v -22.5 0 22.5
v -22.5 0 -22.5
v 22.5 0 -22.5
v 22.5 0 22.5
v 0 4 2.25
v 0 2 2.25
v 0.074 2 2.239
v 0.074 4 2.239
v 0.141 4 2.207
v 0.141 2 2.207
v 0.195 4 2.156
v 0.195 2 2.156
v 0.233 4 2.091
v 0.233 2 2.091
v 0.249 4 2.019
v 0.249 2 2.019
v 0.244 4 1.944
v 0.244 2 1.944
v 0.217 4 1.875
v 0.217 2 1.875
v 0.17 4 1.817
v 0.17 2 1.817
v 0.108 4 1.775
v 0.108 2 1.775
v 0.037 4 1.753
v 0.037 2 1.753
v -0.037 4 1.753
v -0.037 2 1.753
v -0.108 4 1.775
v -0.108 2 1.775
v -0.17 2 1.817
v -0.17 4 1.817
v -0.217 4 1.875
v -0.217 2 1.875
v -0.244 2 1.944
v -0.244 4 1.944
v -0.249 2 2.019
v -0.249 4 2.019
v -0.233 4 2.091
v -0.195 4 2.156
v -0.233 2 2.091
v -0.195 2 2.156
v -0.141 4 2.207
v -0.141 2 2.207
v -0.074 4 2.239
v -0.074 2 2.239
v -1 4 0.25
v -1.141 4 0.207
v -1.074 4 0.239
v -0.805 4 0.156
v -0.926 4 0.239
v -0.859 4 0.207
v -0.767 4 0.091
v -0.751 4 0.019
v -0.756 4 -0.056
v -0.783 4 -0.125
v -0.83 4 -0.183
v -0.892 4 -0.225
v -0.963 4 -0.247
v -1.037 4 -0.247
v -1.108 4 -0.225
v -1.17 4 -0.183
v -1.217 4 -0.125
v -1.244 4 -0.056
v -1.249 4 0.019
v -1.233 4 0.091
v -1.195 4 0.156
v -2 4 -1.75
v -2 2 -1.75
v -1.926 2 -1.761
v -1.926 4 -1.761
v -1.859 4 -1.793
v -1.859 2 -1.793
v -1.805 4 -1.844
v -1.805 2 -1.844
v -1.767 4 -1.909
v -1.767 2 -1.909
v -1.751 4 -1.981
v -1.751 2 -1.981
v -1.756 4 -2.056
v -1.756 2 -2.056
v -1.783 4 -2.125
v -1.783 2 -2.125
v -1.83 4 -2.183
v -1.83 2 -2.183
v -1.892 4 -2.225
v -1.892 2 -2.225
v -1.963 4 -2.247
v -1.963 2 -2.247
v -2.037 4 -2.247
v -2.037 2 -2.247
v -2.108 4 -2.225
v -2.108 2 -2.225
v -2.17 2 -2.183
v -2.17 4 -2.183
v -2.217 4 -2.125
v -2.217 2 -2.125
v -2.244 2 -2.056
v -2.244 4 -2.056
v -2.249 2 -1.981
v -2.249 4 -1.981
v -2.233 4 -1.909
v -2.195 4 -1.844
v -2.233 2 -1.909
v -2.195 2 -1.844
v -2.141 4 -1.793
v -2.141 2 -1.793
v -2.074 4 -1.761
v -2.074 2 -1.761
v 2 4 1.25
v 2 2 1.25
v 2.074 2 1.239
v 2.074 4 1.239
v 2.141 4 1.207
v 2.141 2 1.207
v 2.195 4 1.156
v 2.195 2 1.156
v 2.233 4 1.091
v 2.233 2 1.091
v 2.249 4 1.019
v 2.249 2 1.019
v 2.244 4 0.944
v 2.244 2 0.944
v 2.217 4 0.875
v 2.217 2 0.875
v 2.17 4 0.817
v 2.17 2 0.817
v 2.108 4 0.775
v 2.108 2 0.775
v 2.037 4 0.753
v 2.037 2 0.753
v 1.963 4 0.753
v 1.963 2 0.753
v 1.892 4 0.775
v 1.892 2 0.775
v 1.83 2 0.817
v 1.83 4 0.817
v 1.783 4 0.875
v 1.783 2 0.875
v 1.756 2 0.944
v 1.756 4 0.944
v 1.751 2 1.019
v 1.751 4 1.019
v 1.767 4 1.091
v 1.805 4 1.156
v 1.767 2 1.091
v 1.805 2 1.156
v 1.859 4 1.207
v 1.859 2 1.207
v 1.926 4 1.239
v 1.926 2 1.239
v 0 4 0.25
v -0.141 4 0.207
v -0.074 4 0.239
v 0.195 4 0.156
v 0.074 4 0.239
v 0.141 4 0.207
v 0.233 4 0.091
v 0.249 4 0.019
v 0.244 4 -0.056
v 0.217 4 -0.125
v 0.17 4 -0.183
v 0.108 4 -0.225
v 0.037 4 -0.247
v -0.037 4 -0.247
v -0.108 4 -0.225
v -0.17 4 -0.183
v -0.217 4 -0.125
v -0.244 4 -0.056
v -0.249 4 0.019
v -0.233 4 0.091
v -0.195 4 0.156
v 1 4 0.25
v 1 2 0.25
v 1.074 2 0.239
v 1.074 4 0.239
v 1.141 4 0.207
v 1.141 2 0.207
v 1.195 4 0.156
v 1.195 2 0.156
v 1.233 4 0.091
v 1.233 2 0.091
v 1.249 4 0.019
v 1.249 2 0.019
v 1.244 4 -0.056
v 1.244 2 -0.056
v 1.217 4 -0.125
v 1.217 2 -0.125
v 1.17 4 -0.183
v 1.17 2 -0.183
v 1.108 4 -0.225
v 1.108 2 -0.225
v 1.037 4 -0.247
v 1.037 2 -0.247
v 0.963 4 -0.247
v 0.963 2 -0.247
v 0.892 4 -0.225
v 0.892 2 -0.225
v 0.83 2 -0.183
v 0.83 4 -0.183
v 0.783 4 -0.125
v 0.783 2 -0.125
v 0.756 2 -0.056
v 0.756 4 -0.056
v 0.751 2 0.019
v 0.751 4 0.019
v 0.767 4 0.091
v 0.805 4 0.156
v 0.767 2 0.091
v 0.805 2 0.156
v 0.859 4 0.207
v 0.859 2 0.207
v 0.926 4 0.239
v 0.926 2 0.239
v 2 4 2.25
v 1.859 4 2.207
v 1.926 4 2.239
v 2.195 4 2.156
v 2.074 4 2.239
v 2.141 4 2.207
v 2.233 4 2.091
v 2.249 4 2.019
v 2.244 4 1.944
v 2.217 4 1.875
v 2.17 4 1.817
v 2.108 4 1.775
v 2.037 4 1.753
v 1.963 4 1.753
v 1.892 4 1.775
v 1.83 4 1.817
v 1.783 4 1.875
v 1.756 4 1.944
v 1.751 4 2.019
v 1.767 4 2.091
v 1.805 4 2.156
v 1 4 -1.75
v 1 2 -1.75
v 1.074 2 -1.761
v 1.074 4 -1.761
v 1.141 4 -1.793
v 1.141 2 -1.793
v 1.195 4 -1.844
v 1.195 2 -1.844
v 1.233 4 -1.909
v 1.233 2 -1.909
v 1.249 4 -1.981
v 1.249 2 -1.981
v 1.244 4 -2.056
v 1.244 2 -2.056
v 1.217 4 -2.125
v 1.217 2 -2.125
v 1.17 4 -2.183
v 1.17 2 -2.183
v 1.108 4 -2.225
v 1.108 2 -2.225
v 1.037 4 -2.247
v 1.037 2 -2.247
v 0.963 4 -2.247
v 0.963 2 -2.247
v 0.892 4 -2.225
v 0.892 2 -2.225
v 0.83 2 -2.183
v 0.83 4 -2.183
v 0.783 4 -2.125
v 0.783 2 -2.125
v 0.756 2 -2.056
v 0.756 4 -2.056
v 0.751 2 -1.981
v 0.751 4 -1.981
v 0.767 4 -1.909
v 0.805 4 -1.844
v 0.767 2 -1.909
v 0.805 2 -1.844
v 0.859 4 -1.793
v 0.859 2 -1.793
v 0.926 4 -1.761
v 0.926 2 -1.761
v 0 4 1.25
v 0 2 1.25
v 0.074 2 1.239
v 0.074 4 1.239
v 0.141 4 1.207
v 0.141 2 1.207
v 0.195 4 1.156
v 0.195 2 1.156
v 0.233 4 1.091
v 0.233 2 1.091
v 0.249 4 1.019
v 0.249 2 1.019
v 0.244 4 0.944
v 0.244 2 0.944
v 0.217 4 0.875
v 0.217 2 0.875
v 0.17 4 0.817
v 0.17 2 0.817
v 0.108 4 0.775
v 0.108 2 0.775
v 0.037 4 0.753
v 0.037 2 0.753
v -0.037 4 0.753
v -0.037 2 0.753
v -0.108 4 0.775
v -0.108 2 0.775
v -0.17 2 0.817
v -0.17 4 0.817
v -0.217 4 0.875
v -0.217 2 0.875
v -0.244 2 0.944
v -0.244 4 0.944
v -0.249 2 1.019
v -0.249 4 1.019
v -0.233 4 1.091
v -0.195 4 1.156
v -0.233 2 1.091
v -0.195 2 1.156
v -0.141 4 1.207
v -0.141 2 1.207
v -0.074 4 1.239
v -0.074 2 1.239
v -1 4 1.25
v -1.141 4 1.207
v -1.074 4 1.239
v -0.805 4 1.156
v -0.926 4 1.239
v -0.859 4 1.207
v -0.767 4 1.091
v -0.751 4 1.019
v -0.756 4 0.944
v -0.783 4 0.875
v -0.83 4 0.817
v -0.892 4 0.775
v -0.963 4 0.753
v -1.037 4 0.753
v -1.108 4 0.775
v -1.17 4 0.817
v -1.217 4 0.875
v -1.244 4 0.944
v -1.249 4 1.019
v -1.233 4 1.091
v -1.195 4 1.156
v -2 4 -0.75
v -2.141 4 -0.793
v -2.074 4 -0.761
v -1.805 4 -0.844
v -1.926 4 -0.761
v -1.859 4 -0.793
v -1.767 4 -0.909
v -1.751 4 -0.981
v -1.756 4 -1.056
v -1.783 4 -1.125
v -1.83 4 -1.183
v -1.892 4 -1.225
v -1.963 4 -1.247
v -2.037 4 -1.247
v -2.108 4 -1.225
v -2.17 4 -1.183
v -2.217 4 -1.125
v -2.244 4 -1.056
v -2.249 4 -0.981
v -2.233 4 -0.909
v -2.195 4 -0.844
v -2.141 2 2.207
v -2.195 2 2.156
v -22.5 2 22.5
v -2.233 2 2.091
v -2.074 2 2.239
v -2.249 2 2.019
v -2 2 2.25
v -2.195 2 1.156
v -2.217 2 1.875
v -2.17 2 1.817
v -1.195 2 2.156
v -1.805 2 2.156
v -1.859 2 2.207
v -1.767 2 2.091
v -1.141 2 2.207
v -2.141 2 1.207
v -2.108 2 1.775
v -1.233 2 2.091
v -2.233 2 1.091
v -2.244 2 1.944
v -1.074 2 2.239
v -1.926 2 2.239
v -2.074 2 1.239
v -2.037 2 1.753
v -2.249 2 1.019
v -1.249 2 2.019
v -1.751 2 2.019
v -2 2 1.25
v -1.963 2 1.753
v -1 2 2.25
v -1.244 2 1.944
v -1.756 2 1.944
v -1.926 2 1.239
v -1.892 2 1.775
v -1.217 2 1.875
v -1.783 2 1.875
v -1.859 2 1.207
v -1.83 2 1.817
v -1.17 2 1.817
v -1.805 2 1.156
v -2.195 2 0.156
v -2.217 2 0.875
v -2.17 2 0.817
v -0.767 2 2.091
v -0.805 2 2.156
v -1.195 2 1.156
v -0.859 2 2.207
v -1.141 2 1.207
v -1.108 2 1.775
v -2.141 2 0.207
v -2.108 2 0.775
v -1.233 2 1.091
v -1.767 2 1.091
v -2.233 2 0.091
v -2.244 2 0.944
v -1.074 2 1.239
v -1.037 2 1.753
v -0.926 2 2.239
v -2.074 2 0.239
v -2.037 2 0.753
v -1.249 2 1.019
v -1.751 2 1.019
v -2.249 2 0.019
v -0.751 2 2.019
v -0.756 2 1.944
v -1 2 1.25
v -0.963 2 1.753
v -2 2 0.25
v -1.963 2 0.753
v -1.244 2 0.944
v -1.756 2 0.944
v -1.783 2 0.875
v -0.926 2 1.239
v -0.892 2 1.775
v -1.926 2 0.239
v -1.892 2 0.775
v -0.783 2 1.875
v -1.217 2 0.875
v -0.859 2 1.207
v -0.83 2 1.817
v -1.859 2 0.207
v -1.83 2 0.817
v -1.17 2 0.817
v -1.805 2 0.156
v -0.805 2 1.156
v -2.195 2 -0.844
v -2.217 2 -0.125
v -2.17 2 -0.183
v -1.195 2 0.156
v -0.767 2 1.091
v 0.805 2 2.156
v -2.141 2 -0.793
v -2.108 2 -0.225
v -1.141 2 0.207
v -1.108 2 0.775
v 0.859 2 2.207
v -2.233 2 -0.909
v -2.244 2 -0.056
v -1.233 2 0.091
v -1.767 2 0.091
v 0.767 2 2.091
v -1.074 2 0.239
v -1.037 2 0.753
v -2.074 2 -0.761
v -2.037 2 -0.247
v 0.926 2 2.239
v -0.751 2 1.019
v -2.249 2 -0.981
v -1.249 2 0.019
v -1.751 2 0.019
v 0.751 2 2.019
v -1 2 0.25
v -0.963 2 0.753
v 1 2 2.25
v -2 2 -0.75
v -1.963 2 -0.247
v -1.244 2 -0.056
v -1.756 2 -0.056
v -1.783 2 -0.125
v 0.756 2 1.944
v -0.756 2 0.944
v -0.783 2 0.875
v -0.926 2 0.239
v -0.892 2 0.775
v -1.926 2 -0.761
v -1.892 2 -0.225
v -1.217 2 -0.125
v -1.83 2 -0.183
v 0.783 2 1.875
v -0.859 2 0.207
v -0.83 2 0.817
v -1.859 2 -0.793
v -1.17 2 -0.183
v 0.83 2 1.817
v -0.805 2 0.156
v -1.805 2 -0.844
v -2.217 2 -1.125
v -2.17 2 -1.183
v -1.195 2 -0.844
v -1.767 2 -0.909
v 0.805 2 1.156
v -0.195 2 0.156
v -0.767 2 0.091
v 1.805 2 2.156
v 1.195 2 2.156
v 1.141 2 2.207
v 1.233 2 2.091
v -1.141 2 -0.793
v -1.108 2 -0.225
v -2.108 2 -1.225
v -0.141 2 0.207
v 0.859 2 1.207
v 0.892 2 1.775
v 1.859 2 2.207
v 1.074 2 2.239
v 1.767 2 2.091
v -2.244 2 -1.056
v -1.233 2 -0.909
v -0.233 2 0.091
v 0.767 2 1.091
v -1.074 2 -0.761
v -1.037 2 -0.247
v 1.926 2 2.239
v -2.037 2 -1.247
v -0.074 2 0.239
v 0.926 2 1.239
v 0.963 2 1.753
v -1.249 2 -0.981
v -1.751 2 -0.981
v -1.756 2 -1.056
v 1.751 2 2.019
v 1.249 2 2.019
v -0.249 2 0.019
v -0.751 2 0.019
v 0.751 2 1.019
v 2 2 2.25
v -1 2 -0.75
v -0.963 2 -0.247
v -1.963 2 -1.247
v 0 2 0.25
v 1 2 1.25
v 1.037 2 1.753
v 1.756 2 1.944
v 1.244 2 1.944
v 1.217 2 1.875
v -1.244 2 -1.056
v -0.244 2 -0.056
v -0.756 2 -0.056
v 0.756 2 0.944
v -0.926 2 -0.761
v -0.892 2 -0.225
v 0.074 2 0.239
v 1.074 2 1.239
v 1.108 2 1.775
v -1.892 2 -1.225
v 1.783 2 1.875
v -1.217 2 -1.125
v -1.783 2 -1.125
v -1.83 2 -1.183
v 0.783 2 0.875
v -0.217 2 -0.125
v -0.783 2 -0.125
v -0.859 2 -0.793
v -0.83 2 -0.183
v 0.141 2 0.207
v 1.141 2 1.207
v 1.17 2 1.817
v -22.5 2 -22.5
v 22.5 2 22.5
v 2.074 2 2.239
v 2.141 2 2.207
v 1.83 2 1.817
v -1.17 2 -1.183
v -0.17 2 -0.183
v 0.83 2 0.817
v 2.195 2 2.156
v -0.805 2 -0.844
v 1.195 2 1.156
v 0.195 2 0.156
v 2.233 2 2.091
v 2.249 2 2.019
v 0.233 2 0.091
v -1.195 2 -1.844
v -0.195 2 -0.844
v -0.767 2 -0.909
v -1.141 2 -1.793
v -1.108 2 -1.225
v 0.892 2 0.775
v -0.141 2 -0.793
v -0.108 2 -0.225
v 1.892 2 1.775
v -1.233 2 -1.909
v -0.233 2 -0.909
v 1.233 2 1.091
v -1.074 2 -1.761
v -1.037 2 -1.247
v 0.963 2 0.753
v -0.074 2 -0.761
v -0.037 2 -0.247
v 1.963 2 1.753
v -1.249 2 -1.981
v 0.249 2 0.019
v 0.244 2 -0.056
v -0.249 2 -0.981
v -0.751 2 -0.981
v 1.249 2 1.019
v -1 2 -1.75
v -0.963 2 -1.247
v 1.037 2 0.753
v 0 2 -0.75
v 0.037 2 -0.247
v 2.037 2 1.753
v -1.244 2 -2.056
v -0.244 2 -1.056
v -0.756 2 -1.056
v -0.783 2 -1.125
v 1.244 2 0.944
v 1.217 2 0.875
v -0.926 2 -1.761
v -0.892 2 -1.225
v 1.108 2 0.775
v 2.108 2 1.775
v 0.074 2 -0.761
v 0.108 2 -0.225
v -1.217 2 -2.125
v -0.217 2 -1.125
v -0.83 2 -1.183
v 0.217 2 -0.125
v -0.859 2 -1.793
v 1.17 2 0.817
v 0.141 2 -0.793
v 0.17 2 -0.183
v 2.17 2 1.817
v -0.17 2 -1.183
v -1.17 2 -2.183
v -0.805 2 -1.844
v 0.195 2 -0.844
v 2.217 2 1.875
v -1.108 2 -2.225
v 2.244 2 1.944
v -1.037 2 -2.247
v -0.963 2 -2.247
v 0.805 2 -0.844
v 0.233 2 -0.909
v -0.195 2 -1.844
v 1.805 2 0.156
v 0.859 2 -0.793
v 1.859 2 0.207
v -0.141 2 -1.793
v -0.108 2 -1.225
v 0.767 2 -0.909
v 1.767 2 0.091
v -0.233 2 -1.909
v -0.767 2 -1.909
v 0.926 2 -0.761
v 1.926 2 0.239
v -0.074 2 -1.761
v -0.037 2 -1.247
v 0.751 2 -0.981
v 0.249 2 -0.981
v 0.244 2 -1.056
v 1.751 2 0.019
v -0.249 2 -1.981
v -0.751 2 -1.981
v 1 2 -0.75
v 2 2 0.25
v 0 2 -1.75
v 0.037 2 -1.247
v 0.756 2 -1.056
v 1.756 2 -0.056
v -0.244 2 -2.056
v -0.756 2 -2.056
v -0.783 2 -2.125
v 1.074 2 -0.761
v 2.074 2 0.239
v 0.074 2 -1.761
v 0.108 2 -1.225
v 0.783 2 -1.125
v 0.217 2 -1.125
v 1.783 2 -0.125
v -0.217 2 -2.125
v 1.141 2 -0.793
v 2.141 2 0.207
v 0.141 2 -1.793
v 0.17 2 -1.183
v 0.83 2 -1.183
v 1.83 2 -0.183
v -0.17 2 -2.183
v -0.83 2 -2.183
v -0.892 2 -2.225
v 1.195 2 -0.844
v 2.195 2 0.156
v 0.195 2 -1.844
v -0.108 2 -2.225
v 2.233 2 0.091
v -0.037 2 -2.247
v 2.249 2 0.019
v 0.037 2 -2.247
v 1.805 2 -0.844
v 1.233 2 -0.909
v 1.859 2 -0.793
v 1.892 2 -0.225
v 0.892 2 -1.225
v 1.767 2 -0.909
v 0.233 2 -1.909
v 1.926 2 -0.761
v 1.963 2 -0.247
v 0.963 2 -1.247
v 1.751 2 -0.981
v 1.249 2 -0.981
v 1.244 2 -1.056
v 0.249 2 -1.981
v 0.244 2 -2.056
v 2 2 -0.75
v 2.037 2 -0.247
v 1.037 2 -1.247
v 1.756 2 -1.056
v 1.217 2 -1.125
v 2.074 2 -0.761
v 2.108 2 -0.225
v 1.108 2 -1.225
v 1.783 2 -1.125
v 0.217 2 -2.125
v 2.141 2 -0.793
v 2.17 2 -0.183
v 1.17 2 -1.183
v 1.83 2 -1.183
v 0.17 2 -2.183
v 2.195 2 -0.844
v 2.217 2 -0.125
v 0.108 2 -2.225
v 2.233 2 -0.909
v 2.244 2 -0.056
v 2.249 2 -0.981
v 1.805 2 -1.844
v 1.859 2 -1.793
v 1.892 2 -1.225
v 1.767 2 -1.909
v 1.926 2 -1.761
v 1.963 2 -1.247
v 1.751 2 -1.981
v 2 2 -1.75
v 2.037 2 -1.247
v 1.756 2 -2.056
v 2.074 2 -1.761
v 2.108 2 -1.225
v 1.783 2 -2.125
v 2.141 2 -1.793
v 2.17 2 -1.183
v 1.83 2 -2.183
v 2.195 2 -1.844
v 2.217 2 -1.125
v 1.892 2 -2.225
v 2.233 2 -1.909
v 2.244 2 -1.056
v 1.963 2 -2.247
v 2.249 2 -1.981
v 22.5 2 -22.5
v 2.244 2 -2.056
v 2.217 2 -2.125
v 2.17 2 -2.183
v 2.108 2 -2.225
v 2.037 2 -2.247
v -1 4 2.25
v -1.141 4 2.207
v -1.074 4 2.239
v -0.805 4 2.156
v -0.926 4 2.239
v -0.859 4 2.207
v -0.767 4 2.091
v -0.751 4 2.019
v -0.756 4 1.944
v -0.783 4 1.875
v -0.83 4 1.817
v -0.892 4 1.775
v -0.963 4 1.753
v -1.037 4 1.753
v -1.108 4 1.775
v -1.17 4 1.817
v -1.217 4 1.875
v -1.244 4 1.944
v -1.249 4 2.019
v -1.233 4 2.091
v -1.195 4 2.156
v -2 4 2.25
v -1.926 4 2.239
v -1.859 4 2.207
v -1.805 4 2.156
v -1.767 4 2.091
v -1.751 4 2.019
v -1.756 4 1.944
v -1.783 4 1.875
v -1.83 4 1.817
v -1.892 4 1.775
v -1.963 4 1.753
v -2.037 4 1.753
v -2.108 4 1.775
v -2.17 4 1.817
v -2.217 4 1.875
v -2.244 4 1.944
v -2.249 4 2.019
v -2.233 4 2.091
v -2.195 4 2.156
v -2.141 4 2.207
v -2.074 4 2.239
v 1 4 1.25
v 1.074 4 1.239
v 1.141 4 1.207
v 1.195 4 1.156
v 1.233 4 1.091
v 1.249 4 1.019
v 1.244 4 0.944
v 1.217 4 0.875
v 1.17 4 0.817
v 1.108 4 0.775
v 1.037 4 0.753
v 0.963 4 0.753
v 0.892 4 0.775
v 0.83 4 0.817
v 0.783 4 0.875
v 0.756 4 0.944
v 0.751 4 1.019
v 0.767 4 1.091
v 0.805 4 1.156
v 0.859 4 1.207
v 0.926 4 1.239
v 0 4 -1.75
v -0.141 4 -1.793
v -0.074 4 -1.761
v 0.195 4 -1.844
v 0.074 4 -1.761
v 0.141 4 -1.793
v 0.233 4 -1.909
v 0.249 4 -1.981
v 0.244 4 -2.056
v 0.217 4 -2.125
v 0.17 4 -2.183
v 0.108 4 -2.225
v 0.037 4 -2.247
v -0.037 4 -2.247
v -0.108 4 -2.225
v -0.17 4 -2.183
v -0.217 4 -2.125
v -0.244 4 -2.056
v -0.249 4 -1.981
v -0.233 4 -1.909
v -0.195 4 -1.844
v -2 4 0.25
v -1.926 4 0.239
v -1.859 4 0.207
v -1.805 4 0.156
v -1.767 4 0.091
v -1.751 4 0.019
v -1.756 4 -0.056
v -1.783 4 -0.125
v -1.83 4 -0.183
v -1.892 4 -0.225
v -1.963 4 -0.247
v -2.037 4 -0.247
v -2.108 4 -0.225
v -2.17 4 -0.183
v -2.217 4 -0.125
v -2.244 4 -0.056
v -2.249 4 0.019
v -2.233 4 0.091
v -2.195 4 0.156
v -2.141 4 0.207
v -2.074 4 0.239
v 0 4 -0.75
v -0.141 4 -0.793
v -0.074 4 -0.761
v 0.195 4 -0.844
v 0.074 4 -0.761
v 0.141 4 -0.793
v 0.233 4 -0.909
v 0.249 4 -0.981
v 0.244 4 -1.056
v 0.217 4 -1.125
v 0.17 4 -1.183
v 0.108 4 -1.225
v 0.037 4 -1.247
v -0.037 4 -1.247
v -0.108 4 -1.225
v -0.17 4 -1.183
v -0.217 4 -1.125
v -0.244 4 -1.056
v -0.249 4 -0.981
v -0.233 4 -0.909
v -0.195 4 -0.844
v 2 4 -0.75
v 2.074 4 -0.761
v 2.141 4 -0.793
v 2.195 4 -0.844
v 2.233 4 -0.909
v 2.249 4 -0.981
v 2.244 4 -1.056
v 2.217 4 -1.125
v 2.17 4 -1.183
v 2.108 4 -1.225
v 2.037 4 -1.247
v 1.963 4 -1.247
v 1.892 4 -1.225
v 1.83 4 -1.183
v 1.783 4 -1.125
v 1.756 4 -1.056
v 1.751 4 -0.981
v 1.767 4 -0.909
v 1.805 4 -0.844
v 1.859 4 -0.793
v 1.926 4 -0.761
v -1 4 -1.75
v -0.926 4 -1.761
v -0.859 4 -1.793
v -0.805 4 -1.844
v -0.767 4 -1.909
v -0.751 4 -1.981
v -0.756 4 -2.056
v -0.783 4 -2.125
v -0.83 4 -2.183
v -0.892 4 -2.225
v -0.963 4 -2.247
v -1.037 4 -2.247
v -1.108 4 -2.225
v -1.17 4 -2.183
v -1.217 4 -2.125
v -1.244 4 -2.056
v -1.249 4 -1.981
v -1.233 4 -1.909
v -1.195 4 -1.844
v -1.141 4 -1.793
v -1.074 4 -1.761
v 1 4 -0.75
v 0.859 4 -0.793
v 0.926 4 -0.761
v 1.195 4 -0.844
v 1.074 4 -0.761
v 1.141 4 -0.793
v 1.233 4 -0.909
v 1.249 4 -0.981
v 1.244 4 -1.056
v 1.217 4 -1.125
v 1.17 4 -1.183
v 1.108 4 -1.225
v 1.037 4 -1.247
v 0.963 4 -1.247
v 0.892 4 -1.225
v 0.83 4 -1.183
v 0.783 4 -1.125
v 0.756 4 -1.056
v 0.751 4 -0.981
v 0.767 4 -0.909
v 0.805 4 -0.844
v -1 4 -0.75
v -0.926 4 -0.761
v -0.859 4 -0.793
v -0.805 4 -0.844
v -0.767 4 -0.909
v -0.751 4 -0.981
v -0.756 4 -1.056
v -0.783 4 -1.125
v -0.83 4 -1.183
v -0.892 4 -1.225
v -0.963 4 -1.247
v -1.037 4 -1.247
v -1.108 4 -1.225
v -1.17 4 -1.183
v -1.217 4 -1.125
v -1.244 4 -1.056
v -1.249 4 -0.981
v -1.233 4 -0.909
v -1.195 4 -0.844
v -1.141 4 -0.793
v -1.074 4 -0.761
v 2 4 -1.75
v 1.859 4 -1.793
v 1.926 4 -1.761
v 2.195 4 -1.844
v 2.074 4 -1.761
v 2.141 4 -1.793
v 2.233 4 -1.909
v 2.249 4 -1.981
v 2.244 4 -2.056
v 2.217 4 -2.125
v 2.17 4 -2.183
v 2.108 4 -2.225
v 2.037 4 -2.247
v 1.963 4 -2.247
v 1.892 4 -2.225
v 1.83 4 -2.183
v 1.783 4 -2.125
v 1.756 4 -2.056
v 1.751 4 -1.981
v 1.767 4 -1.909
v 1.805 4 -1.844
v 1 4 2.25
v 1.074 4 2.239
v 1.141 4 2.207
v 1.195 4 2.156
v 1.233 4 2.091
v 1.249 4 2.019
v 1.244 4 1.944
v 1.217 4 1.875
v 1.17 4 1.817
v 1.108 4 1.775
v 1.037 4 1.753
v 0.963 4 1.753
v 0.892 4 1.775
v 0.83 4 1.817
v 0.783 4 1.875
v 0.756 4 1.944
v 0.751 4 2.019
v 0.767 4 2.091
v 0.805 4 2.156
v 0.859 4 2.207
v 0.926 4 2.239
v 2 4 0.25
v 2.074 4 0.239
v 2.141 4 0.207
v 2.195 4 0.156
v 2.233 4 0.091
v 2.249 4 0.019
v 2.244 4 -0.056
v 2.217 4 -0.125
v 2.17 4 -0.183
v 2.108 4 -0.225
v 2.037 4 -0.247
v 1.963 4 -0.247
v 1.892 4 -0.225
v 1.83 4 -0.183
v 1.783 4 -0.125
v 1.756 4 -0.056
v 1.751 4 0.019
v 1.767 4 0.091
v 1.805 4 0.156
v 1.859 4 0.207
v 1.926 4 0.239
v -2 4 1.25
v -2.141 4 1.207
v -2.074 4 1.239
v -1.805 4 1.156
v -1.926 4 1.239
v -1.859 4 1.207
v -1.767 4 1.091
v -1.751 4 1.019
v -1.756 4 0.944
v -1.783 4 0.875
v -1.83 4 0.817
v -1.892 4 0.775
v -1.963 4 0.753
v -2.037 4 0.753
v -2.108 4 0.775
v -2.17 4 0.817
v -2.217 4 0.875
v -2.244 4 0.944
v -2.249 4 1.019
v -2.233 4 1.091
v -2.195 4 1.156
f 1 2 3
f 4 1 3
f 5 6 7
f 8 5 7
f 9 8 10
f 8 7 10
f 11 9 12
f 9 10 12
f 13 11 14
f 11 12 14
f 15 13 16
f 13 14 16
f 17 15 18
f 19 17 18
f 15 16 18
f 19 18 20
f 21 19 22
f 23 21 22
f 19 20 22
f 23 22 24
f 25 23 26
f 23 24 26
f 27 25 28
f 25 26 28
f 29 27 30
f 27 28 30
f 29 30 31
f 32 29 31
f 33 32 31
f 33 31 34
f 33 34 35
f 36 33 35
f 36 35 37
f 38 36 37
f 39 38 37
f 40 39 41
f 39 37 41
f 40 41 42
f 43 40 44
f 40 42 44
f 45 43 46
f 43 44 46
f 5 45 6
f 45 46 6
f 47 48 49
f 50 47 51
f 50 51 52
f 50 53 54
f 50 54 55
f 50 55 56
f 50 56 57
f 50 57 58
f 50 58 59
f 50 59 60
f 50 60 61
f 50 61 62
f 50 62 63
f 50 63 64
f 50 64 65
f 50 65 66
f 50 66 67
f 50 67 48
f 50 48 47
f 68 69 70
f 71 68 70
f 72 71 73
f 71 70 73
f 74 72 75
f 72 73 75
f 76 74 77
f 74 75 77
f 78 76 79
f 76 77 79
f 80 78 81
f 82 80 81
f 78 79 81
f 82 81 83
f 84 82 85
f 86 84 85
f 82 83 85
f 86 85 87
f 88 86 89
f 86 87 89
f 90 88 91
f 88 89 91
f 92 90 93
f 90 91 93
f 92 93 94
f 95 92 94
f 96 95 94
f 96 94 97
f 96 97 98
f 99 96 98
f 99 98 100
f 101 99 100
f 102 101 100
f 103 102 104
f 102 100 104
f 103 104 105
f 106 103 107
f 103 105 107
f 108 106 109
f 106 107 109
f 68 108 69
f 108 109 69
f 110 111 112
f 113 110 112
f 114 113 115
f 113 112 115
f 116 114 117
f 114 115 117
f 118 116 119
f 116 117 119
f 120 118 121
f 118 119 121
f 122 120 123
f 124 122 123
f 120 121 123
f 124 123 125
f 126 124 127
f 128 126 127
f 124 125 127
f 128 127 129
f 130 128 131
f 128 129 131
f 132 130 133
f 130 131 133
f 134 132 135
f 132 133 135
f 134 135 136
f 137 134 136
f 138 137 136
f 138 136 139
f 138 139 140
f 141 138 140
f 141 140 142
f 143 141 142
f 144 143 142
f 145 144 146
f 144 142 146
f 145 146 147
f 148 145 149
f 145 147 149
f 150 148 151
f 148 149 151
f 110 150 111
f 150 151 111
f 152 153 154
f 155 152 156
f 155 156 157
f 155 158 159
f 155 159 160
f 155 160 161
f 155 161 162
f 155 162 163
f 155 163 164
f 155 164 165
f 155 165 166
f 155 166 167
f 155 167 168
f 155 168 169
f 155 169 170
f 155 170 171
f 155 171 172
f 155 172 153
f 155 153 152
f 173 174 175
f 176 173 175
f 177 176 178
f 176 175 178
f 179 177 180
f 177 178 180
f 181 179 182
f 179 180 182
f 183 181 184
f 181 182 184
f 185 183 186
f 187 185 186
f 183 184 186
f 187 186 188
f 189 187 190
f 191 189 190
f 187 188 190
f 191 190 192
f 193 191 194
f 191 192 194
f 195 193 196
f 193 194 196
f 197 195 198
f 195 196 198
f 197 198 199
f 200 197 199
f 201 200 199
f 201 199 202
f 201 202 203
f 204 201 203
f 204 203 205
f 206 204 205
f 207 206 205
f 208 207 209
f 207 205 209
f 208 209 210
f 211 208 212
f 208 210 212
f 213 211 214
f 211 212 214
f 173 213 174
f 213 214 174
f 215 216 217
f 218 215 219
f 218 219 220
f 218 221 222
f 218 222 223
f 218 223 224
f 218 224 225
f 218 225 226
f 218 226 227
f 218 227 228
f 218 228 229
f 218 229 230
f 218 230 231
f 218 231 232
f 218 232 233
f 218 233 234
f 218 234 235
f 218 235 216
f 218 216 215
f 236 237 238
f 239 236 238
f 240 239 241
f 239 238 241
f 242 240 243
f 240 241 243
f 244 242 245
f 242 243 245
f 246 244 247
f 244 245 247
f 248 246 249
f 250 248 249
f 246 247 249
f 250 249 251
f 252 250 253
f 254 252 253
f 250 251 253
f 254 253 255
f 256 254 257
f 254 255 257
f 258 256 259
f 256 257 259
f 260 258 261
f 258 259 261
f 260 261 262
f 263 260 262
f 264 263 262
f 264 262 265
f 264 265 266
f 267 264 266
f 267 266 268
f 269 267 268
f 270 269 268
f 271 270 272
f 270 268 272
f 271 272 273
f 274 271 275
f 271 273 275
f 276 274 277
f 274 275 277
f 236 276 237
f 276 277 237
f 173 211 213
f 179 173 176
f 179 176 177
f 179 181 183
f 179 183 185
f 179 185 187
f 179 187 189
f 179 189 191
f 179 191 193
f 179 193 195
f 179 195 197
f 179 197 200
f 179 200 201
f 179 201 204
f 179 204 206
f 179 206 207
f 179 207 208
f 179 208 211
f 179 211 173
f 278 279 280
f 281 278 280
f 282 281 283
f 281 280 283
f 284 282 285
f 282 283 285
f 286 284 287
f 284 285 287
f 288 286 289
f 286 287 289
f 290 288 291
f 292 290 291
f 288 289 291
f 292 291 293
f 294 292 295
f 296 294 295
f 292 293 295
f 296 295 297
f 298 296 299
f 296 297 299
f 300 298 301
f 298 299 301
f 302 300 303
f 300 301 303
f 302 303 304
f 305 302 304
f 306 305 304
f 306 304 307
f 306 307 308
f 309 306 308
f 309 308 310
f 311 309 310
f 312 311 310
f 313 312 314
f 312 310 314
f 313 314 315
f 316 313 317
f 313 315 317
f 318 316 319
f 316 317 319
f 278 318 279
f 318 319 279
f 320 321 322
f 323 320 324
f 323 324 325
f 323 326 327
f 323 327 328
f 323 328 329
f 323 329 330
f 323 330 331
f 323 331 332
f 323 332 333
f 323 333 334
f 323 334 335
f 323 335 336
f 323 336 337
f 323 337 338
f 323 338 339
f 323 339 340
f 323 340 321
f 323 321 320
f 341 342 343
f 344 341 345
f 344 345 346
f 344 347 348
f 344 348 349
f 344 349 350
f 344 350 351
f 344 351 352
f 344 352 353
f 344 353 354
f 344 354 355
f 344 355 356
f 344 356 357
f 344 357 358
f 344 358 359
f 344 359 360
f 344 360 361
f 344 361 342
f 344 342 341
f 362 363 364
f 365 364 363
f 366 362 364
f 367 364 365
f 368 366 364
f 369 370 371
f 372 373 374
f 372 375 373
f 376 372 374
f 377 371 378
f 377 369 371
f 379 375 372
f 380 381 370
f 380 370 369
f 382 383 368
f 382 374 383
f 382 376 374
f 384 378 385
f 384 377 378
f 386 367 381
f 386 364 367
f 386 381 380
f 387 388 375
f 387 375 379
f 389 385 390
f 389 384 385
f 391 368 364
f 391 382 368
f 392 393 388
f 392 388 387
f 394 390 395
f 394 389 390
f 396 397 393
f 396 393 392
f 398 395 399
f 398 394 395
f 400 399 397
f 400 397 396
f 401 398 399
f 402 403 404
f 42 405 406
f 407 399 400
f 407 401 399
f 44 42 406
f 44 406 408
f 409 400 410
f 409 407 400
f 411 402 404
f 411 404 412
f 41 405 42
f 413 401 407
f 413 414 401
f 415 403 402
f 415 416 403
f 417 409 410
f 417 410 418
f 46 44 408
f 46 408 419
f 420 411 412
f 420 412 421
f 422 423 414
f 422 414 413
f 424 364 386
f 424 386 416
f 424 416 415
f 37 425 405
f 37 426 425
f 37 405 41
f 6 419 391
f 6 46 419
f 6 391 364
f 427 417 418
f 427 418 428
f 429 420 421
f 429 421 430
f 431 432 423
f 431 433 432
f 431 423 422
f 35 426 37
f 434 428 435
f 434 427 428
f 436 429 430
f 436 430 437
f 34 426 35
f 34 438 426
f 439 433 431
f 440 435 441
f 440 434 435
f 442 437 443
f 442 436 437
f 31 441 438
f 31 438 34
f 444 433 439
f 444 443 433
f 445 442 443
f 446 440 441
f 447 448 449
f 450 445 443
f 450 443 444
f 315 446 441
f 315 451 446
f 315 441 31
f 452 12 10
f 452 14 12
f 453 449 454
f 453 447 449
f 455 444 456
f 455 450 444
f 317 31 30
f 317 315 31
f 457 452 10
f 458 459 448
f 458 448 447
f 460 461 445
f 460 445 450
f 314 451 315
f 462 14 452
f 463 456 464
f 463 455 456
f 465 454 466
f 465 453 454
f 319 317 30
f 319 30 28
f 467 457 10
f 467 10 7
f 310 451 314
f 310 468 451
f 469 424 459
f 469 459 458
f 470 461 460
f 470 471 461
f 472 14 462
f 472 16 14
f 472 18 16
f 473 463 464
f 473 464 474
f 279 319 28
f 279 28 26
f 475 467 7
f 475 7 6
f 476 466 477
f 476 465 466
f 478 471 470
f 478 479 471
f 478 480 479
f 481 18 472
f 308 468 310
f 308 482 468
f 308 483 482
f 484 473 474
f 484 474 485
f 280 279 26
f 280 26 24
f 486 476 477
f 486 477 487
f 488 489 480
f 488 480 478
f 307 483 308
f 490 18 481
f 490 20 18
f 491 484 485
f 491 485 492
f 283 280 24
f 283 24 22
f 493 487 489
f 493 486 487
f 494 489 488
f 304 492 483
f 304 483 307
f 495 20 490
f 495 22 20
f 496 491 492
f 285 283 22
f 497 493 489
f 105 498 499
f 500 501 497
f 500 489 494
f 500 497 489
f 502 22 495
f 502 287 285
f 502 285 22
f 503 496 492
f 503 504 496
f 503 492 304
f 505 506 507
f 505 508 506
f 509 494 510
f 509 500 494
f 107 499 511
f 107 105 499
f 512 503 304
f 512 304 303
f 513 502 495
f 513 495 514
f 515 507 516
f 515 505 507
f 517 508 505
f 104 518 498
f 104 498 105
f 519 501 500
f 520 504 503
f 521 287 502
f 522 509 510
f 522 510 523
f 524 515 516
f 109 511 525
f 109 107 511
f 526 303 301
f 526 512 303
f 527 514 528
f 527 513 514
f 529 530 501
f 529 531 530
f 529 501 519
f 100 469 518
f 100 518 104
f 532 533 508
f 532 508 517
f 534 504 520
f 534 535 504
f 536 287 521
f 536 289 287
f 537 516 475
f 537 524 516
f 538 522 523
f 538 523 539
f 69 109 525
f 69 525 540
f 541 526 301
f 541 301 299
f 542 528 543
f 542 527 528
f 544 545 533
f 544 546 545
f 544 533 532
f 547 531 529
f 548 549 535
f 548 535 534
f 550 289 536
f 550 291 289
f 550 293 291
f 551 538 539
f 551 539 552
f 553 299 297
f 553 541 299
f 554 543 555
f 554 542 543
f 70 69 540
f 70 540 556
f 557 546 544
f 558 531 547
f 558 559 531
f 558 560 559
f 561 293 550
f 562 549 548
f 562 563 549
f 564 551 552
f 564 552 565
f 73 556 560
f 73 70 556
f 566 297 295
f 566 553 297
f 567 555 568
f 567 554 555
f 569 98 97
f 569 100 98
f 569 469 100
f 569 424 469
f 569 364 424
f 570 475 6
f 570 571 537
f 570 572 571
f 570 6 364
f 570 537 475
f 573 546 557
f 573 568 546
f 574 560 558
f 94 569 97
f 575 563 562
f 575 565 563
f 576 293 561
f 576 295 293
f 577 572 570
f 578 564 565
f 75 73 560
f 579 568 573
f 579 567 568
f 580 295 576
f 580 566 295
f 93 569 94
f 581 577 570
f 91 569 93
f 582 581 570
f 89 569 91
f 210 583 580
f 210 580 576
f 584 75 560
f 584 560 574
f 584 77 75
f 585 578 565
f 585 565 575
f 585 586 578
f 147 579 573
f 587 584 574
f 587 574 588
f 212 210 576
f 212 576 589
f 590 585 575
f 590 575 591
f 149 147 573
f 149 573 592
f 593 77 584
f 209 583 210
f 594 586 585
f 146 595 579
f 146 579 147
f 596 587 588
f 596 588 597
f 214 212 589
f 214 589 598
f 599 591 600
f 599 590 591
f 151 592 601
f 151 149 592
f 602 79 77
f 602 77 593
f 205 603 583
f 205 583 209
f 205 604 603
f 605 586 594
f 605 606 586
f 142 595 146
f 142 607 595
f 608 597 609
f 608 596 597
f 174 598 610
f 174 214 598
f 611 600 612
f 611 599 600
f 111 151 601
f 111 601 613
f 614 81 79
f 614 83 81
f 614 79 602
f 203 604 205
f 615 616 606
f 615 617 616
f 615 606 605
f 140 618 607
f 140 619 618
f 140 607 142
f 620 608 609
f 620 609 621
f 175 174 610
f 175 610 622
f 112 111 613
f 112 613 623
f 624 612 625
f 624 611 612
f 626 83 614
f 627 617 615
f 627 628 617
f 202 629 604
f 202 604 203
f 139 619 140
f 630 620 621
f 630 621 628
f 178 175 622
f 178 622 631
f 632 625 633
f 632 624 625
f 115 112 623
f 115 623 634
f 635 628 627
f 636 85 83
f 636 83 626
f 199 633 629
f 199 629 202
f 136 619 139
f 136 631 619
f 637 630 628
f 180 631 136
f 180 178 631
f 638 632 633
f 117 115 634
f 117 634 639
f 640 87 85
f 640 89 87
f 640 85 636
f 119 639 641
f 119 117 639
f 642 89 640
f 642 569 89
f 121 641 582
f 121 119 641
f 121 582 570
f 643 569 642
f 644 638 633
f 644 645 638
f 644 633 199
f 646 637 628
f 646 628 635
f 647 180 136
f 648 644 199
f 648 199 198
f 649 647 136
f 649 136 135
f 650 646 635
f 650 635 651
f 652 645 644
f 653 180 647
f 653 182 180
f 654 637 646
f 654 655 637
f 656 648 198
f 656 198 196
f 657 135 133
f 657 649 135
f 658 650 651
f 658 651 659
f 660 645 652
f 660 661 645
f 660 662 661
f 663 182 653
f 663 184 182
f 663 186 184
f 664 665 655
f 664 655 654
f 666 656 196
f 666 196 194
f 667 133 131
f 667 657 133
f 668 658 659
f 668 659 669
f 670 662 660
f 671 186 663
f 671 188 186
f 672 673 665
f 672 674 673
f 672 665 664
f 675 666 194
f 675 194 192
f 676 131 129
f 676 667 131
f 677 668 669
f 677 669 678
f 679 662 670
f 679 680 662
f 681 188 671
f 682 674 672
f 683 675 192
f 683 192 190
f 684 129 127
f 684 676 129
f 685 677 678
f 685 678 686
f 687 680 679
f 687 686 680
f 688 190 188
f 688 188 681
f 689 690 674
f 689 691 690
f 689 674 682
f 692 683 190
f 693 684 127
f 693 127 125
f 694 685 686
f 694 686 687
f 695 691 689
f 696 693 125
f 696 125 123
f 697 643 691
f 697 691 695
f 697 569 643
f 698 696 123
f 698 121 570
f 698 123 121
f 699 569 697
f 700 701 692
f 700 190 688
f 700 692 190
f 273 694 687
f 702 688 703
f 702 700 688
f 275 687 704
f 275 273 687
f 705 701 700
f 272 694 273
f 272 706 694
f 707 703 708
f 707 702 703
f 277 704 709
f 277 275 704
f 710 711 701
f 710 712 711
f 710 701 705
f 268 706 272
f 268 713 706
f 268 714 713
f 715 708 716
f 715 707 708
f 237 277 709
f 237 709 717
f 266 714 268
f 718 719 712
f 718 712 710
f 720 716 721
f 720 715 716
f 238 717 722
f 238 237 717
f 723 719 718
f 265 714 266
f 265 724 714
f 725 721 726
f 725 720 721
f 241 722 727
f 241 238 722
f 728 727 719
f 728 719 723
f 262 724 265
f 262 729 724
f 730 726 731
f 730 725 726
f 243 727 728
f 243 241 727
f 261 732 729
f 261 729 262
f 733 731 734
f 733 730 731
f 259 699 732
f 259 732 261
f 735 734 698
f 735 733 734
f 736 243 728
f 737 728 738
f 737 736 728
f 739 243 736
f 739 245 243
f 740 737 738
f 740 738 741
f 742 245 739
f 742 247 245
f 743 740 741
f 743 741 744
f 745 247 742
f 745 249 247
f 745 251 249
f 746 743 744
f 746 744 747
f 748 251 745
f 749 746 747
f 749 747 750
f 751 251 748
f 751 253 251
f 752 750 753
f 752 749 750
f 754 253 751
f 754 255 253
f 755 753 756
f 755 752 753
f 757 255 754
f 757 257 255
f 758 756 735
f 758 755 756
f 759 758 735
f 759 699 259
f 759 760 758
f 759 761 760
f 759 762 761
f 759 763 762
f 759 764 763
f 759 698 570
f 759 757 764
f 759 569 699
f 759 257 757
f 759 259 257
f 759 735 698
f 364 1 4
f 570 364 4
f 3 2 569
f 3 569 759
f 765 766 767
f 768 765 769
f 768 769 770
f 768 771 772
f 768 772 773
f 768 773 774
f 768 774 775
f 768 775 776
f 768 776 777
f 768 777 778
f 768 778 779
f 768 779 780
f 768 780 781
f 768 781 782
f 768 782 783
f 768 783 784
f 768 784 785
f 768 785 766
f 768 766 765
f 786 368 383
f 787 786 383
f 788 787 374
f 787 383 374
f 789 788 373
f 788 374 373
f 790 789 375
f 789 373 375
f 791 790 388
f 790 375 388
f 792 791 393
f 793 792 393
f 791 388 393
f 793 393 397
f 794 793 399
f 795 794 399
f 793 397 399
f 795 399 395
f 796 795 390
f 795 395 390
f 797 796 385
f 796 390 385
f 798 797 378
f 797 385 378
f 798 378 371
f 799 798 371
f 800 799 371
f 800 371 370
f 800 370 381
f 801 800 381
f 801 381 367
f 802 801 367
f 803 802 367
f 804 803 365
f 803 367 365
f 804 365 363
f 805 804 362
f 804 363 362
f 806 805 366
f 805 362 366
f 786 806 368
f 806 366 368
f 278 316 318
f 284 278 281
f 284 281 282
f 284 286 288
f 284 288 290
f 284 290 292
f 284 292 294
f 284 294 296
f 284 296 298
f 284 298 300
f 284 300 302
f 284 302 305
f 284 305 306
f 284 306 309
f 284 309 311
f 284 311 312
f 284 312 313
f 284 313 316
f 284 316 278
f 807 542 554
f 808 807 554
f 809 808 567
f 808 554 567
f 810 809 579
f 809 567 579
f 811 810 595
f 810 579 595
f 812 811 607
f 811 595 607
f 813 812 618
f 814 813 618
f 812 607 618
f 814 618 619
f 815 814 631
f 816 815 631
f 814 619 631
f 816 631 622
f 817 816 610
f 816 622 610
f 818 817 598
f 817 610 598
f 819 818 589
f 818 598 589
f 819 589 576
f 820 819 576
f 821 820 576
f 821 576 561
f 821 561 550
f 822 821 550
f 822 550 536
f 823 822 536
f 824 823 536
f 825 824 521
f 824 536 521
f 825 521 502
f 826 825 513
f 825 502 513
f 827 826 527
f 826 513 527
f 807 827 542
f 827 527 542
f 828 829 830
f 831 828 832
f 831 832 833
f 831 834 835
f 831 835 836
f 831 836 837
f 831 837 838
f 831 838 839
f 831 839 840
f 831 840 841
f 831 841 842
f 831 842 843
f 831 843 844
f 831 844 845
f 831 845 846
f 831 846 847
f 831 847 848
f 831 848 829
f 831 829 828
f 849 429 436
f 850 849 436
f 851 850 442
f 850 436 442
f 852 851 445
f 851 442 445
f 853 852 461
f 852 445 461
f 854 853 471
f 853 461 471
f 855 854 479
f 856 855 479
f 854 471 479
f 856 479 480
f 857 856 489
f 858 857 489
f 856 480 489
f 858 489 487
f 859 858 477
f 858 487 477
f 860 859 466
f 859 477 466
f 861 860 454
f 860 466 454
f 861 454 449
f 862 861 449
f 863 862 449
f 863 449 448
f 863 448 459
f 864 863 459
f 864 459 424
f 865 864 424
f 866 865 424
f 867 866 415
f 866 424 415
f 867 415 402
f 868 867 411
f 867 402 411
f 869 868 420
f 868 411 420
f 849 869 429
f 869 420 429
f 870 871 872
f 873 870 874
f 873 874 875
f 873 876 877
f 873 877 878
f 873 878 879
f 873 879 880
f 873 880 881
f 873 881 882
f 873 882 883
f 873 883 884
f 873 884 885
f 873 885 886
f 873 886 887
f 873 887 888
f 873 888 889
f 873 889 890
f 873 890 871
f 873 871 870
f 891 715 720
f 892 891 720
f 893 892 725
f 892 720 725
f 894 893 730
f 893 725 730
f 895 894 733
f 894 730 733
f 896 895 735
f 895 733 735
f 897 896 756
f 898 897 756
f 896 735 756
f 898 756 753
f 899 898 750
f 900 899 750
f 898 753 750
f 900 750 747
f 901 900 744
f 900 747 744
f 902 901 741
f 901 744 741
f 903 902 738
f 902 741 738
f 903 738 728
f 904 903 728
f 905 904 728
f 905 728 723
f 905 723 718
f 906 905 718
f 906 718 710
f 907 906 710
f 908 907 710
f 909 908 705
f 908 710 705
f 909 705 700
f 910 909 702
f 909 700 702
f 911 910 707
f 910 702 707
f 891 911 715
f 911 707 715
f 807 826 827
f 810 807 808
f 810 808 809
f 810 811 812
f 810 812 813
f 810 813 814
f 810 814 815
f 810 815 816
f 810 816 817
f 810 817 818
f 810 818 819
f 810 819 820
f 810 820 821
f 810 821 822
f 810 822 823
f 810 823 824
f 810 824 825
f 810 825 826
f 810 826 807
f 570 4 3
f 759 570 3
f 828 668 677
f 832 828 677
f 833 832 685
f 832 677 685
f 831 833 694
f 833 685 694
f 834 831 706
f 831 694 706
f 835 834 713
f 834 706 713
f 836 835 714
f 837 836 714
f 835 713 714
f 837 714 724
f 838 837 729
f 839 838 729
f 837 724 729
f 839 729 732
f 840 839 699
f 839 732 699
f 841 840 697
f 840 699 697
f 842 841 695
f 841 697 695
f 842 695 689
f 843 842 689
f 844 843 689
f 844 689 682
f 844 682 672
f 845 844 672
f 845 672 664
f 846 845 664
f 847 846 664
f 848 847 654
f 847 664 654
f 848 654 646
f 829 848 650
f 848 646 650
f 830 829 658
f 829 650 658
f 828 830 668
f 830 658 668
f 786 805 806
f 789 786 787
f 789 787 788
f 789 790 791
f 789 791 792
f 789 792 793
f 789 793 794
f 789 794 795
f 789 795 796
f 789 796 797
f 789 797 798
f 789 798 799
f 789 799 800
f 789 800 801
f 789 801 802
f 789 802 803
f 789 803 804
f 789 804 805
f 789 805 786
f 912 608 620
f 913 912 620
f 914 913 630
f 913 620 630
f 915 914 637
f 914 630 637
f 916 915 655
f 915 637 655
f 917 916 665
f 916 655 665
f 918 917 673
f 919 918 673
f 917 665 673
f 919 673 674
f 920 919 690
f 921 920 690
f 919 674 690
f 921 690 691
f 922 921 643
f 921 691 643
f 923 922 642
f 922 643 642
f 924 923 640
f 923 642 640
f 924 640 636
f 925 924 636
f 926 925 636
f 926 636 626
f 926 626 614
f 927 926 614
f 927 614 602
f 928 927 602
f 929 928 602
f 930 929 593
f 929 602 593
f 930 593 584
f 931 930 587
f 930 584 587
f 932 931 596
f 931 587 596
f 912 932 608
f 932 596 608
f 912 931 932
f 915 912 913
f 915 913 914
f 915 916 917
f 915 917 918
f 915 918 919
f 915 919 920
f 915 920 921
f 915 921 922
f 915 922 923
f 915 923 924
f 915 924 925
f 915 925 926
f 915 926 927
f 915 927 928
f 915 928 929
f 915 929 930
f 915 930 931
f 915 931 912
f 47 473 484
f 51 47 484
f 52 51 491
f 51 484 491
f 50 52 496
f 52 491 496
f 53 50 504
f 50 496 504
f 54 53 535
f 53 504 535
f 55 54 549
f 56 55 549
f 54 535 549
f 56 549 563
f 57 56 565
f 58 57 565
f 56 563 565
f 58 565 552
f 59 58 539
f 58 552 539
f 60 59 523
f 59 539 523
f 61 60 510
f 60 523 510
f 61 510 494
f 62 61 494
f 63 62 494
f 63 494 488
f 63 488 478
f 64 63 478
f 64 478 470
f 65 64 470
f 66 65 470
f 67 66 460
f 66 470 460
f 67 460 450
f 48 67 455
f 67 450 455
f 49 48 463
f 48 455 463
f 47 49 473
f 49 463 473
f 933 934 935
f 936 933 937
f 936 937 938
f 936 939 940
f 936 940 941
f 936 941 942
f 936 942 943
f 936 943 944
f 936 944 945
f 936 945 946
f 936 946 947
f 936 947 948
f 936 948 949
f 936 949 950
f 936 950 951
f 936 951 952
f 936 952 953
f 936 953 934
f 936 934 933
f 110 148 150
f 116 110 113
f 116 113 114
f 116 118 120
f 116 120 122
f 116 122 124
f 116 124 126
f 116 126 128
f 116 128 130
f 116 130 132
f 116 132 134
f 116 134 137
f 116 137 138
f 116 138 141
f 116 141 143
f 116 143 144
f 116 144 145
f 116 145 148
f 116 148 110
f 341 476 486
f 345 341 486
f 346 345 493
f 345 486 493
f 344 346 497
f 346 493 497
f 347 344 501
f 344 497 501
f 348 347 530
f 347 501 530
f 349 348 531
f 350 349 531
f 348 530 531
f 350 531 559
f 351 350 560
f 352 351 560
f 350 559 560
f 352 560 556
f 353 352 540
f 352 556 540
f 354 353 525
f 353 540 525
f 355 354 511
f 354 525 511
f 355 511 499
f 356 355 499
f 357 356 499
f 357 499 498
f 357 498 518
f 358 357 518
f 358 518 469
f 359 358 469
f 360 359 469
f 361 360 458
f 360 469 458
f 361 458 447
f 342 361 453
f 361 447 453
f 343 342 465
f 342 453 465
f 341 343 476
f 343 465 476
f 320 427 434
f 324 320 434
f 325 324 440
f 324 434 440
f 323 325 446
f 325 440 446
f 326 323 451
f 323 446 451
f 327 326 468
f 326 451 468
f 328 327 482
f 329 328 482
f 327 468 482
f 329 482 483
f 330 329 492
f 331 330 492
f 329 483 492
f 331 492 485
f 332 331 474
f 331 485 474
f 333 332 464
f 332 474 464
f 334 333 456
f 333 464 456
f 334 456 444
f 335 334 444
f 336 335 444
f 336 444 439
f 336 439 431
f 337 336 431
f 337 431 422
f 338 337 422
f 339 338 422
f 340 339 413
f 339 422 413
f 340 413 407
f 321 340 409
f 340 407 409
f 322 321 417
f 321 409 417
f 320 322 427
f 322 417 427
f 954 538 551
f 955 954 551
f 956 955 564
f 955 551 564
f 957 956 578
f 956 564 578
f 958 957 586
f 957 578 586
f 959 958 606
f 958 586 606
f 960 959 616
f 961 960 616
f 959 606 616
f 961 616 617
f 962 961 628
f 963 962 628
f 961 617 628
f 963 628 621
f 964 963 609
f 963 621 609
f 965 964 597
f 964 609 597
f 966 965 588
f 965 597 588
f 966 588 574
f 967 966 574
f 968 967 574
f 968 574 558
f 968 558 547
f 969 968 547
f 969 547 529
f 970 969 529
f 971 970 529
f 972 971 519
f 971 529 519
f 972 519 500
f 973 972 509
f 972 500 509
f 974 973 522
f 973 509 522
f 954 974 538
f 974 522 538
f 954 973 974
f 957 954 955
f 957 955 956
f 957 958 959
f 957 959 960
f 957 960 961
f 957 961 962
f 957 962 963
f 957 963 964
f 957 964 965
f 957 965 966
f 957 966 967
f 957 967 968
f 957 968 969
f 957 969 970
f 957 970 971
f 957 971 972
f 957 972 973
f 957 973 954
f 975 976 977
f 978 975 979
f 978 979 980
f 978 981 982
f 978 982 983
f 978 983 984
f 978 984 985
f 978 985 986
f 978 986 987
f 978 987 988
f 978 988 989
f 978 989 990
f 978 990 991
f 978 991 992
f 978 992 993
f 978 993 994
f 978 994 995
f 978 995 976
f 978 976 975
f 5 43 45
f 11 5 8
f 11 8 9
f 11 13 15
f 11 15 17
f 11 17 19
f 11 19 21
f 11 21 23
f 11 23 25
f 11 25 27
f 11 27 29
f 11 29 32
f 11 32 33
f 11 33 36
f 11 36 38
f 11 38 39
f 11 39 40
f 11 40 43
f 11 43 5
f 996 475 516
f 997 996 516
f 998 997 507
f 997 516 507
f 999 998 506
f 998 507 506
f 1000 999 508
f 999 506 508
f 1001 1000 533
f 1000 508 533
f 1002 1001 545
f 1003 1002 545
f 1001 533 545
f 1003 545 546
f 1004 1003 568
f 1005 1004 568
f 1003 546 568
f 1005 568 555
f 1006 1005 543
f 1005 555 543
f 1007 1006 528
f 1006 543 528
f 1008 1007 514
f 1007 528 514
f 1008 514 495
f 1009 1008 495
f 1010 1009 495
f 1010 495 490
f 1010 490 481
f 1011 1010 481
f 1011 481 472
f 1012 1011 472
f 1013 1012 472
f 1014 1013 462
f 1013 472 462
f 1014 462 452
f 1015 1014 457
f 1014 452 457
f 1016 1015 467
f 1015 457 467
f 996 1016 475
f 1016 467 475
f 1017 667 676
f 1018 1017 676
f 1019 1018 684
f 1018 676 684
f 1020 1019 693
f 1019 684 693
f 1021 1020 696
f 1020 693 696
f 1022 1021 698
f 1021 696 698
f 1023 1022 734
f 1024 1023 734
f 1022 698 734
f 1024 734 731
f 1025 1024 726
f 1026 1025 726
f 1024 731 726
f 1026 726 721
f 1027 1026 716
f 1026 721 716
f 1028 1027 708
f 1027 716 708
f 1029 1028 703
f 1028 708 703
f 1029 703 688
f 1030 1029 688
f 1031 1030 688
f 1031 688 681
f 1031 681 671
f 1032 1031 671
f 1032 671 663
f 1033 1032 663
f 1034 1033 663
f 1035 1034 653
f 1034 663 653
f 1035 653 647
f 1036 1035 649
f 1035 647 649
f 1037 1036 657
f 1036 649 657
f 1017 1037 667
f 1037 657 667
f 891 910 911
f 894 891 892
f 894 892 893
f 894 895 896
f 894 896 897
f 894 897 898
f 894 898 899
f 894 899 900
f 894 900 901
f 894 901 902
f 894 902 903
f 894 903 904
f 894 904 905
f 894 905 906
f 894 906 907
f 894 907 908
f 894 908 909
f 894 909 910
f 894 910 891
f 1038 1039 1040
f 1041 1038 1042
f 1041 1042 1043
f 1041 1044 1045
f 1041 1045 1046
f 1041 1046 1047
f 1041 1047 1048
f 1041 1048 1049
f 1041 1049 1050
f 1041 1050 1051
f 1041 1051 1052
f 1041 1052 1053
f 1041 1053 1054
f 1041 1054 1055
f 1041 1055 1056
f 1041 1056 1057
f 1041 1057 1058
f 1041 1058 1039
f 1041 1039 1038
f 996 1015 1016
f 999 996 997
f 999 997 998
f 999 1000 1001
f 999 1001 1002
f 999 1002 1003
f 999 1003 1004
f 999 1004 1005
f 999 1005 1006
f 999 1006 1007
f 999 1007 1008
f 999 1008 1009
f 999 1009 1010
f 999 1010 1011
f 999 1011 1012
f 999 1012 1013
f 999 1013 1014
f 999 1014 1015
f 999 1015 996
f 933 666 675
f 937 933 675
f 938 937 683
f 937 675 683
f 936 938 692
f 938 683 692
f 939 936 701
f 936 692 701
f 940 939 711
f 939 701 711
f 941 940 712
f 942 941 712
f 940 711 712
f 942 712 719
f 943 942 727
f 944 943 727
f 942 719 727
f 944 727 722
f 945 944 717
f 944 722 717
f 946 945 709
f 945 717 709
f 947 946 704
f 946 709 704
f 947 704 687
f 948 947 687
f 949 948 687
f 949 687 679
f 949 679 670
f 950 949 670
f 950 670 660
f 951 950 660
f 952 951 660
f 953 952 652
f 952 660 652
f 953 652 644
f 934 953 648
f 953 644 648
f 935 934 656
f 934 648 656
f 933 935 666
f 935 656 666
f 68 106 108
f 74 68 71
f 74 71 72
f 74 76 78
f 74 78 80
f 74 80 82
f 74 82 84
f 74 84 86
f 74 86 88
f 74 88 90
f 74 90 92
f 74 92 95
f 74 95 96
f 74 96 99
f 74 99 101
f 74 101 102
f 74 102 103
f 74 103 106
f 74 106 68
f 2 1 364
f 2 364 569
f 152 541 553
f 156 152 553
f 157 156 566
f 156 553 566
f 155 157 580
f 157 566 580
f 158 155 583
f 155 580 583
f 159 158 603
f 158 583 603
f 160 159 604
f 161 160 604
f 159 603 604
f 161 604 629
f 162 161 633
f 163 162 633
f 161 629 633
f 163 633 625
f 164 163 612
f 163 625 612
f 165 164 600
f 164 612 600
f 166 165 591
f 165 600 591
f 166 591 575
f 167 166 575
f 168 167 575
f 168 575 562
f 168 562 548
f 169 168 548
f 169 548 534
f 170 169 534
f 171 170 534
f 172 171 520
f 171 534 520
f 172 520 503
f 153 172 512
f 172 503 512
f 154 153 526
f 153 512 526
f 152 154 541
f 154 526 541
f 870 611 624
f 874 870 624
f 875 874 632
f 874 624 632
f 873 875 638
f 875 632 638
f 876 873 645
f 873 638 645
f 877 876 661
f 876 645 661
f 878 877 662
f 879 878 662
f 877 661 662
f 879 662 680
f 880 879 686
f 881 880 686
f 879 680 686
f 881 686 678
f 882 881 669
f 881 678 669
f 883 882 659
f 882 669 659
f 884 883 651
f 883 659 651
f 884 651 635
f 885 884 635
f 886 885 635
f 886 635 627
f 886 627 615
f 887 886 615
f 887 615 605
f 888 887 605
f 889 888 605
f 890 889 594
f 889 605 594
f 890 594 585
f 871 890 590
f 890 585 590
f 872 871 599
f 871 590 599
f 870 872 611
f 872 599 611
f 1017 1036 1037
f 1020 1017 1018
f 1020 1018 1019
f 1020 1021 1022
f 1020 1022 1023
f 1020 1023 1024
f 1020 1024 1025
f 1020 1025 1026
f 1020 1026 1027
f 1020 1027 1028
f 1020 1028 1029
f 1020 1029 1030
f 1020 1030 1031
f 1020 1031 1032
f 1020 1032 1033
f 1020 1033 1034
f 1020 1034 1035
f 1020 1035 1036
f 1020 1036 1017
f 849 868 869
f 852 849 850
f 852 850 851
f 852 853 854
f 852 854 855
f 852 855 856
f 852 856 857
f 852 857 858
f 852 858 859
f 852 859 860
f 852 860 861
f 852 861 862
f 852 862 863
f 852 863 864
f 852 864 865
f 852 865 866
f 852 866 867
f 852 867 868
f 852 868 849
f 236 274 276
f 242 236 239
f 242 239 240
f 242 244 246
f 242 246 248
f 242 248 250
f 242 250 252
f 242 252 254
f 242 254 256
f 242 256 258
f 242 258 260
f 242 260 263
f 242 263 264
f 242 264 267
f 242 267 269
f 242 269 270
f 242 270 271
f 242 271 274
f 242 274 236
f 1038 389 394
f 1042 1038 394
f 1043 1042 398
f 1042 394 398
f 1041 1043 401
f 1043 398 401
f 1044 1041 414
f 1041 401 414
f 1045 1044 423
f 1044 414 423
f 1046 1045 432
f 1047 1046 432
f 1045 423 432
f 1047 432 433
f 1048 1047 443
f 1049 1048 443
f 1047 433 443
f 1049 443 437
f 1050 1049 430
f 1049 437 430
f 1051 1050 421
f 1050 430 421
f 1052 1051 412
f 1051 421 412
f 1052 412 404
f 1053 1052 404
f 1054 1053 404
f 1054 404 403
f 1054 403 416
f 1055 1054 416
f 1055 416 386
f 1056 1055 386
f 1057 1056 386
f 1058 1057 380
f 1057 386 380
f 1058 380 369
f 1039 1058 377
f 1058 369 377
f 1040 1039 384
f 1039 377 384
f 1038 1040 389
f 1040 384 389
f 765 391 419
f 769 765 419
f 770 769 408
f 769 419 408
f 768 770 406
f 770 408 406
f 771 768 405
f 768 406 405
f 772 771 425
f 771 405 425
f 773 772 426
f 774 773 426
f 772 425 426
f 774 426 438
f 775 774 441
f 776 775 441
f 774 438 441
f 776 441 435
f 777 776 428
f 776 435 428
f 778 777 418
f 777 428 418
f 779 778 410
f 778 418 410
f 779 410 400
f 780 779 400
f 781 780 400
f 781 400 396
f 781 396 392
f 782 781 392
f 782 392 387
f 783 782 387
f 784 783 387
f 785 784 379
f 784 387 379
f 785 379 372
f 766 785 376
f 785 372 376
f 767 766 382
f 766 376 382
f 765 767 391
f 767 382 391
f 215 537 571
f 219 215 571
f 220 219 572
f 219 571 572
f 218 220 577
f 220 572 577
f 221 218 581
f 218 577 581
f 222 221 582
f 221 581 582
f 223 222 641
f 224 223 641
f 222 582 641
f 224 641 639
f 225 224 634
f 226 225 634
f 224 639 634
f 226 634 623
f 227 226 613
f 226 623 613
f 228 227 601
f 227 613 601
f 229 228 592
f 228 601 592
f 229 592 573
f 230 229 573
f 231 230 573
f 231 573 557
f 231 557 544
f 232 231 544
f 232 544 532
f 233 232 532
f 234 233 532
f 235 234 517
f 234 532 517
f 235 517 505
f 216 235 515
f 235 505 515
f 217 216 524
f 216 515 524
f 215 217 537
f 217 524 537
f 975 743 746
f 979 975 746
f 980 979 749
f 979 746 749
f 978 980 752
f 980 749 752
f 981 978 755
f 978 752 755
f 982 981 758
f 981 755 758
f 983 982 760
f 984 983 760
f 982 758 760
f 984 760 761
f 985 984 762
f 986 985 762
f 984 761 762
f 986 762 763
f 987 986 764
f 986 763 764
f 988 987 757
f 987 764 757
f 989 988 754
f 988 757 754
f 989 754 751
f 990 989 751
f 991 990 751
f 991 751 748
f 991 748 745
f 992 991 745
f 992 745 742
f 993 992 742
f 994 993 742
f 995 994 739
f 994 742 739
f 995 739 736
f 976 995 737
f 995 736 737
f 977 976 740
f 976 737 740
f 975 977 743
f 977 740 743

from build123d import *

# Parameters (mm, degrees)
SKETCH1_W                 = 45
SKETCH1_H                 = 45
BASEPLATE_DEPTH           = 2
SKETCH2_R                 = 0.25
PINFIN_DEPTH              = 2
PINFIN_PATTERN_COUNT      = 5
PINFIN_PATTERN_PITCH      = 1
PINFIN_PATTERN_COUNT_DIR2 = 5
PINFIN_PATTERN_PITCH_DIR2 = 1


with BuildPart() as part:
    # Sketch1 → Baseplate (new body)
    with BuildSketch(Plane(origin=(0, 0, 0), x_dir=(1, 0, 0), z_dir=(0, 1, 0))):
        Rectangle(SKETCH1_W, SKETCH1_H)
    extrude(amount=BASEPLATE_DEPTH)

    # Sketch2 → Pinfin (add)
    with BuildSketch(Plane(origin=(0, 2, 0), x_dir=(1, 0, 0), z_dir=(0, 1, 0))):
        with Locations(Location((-2, -2, 0), (0, 0, 270))):
            Circle(SKETCH2_R)
    pinfin = extrude(amount=PINFIN_DEPTH)

    # Pinfin Pattern: Pinfin 5 × 5
    with Locations(*[(j * PINFIN_PATTERN_PITCH_DIR2, 0, -i * PINFIN_PATTERN_PITCH) for i in range(PINFIN_PATTERN_COUNT) for j in range(PINFIN_PATTERN_COUNT_DIR2) if (i, j) != (0, 0)]):
        add(pinfin)


solid = part.part
